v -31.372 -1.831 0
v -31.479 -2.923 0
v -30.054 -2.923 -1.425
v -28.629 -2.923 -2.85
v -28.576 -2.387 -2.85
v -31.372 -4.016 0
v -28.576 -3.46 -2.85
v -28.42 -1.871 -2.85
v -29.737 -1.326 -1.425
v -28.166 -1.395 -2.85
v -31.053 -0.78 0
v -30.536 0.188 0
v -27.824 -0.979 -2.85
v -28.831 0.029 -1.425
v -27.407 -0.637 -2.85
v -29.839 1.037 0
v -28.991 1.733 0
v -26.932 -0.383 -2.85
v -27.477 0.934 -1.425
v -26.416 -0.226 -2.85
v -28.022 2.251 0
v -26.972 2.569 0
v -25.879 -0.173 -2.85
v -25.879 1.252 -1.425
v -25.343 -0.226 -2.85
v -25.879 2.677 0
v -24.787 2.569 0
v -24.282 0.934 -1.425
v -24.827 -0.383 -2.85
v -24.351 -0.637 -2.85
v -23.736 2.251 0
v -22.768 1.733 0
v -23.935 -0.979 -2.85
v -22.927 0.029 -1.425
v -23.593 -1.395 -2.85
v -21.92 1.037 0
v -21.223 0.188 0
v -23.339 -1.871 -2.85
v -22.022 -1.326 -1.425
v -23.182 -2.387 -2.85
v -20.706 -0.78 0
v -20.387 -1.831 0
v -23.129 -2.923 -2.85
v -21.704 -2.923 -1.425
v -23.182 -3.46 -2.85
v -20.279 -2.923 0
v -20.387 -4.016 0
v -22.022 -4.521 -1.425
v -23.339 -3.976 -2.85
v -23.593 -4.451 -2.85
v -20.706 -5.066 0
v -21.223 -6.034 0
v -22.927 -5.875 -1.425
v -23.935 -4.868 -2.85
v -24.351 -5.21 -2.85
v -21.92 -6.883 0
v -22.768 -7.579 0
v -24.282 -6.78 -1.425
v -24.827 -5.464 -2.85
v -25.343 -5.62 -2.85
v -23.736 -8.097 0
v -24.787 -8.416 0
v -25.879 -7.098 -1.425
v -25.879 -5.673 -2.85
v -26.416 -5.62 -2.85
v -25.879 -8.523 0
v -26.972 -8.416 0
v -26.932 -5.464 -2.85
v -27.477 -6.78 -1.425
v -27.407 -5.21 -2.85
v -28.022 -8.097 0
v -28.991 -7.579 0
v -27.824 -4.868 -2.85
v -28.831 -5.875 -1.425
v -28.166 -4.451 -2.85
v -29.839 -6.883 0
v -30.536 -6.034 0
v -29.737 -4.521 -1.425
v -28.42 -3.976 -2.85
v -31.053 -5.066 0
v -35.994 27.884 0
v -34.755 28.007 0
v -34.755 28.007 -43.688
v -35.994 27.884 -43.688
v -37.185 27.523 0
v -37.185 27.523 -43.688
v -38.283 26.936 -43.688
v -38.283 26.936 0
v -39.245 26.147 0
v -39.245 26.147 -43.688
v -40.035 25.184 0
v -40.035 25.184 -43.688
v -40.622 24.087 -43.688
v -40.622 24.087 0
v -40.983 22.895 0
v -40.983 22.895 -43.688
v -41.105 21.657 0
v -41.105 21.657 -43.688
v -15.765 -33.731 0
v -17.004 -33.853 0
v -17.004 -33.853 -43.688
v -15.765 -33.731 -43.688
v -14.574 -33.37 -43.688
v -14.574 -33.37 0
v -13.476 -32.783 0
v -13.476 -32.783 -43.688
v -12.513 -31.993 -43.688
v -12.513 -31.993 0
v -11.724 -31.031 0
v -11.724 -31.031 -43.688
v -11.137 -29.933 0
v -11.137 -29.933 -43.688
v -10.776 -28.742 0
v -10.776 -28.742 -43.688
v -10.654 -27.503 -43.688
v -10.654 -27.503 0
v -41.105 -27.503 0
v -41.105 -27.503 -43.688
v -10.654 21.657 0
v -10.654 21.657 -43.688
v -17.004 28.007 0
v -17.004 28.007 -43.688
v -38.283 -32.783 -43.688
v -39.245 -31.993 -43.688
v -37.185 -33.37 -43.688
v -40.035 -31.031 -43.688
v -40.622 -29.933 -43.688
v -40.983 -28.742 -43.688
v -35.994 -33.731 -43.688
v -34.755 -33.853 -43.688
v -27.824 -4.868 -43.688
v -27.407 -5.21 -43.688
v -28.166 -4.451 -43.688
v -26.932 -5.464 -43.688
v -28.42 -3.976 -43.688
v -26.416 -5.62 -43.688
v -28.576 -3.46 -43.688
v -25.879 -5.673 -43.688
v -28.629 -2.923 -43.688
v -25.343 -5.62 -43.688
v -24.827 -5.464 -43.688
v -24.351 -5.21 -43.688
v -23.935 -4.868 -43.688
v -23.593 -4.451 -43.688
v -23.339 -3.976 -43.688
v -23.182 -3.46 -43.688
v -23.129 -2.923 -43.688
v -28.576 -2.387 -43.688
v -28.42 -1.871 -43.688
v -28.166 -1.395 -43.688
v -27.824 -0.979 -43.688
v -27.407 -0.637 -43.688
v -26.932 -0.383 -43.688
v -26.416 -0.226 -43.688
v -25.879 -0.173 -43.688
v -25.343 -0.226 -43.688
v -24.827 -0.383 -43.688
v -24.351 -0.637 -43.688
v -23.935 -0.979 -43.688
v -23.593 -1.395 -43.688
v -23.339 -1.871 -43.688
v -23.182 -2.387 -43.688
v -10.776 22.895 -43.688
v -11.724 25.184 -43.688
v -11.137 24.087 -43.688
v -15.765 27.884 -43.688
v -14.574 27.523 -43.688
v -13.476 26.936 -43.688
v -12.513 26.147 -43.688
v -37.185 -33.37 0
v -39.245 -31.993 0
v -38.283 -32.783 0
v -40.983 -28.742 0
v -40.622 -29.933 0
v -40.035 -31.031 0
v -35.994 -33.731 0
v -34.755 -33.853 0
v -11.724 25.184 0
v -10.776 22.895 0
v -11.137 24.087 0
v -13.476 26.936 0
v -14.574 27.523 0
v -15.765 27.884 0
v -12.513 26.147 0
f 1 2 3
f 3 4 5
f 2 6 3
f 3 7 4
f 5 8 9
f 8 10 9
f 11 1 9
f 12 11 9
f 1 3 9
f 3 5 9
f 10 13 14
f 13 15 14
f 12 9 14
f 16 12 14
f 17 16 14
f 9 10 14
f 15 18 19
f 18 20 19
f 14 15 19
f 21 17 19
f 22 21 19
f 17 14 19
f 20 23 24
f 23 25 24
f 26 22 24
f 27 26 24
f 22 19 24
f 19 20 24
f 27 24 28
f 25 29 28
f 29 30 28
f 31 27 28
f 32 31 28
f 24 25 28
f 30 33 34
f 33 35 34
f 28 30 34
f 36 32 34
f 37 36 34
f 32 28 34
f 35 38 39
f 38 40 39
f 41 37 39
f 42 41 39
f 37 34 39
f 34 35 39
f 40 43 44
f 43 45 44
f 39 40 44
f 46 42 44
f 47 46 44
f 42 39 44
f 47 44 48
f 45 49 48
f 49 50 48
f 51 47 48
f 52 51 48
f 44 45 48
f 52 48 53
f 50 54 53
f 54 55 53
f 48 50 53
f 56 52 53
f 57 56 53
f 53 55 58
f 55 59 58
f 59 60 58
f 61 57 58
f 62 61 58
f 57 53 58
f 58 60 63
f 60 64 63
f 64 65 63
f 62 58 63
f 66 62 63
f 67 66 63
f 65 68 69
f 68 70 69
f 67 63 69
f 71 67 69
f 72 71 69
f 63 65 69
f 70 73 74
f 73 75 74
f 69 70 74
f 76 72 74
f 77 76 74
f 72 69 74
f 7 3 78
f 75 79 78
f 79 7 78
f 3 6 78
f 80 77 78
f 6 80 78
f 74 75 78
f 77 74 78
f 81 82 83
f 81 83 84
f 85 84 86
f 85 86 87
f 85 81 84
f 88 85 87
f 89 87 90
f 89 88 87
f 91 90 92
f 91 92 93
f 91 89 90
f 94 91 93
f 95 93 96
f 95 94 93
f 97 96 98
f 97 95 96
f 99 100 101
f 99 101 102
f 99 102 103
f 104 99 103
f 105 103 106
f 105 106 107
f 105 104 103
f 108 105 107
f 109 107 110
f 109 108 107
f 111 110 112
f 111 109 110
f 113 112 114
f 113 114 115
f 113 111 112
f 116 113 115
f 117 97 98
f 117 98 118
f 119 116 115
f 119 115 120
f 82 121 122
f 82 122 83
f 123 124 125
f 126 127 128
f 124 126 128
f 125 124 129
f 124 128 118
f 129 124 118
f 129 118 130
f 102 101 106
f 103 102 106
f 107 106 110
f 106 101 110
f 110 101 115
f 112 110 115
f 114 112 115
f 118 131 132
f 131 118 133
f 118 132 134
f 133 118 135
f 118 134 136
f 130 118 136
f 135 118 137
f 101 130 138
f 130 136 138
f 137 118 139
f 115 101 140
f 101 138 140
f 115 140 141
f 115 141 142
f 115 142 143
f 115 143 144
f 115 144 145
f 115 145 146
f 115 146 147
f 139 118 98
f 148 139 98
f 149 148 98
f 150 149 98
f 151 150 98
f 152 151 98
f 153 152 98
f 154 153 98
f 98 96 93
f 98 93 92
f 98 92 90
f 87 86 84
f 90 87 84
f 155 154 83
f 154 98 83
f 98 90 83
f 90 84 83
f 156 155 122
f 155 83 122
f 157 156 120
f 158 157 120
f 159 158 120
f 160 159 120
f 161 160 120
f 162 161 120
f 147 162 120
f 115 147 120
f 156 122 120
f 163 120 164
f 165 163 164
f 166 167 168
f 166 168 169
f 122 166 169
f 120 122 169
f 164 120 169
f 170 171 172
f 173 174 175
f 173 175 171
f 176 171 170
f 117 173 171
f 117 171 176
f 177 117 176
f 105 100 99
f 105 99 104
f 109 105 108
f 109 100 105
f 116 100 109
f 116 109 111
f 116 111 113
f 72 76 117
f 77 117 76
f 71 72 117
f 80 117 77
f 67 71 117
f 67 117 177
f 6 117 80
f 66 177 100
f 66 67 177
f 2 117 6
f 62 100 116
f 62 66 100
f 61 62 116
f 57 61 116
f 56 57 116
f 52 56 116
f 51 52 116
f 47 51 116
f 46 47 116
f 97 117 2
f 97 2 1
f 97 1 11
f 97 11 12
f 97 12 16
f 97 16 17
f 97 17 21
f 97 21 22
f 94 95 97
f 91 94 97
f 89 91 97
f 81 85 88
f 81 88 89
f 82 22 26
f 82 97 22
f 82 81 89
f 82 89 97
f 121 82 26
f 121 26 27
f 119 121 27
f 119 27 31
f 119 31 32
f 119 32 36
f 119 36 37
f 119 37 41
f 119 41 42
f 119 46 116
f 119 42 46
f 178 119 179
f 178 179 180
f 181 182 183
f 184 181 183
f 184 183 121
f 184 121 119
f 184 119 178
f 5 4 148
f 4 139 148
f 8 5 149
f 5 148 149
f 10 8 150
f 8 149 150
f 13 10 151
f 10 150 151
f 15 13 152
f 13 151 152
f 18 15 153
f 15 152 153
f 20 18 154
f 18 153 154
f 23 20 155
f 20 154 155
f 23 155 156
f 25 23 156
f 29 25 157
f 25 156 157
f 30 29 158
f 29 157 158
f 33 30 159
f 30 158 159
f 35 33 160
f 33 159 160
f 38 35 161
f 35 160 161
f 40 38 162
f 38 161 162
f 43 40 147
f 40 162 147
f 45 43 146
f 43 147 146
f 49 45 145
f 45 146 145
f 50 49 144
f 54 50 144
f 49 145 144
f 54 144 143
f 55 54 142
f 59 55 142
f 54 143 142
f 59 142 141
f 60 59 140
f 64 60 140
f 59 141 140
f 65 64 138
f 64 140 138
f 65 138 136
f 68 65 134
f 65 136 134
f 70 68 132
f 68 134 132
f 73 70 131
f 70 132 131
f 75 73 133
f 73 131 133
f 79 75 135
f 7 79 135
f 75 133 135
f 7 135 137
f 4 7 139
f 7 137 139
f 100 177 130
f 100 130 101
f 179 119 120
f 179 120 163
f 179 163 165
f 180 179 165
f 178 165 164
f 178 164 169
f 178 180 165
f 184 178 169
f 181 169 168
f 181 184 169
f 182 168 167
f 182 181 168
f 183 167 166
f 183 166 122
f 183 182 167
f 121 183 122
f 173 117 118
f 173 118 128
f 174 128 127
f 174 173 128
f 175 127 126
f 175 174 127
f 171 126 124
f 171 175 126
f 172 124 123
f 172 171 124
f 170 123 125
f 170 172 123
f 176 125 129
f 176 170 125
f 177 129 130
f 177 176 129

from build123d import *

# Parameters (mm, degrees)
F1_DEPTH       = 43.688
F2_D           = 5.5
F2_CSINK_D     = 11.2
F2_CSINK_ANGLE = 90


with BuildPart() as f1:
    # F0 (on Top) → F1 (new body)
    with BuildSketch(Plane.XY):
        with BuildLine():
            Line((-17.0035926461, 28.0065052211), (-34.7550207913, 28.0065052211))
            ThreePointArc((-34.7550207913, 28.0065052211), (-39.2451488518, 26.1466332817), (-41.1050207913, 21.6565052211))
            Line((-41.1050207913, 21.6565052211), (-41.1050207913, -27.5029422879))
            ThreePointArc((-41.1050207913, -27.5029422879), (-39.2451488518, -31.9930703485), (-34.7550207913, -33.8529422879))
            Line((-34.7550207913, -33.8529422879), (-17.0035926461, -33.8529422879))
            ThreePointArc((-17.0035926461, -33.8529422879), (-12.5134645856, -31.9930703485), (-10.6535926461, -27.5029422879))
            Line((-10.6535926461, -27.5029422879), (-10.6535926461, 21.6565052211))
            ThreePointArc((-10.6535926461, 21.6565052211), (-12.5134645856, 26.1466332817), (-17.0035926461, 28.0065052211))
        make_face()
    extrude(amount=-F1_DEPTH)

    # F2 (through all)
    with Locations(Plane.XY):
        with Locations((-25.8793067187, -2.9232185334)):
            CounterSinkHole(F2_D / 2, F2_CSINK_D / 2, counter_sink_angle=F2_CSINK_ANGLE)


solid = f1.part
